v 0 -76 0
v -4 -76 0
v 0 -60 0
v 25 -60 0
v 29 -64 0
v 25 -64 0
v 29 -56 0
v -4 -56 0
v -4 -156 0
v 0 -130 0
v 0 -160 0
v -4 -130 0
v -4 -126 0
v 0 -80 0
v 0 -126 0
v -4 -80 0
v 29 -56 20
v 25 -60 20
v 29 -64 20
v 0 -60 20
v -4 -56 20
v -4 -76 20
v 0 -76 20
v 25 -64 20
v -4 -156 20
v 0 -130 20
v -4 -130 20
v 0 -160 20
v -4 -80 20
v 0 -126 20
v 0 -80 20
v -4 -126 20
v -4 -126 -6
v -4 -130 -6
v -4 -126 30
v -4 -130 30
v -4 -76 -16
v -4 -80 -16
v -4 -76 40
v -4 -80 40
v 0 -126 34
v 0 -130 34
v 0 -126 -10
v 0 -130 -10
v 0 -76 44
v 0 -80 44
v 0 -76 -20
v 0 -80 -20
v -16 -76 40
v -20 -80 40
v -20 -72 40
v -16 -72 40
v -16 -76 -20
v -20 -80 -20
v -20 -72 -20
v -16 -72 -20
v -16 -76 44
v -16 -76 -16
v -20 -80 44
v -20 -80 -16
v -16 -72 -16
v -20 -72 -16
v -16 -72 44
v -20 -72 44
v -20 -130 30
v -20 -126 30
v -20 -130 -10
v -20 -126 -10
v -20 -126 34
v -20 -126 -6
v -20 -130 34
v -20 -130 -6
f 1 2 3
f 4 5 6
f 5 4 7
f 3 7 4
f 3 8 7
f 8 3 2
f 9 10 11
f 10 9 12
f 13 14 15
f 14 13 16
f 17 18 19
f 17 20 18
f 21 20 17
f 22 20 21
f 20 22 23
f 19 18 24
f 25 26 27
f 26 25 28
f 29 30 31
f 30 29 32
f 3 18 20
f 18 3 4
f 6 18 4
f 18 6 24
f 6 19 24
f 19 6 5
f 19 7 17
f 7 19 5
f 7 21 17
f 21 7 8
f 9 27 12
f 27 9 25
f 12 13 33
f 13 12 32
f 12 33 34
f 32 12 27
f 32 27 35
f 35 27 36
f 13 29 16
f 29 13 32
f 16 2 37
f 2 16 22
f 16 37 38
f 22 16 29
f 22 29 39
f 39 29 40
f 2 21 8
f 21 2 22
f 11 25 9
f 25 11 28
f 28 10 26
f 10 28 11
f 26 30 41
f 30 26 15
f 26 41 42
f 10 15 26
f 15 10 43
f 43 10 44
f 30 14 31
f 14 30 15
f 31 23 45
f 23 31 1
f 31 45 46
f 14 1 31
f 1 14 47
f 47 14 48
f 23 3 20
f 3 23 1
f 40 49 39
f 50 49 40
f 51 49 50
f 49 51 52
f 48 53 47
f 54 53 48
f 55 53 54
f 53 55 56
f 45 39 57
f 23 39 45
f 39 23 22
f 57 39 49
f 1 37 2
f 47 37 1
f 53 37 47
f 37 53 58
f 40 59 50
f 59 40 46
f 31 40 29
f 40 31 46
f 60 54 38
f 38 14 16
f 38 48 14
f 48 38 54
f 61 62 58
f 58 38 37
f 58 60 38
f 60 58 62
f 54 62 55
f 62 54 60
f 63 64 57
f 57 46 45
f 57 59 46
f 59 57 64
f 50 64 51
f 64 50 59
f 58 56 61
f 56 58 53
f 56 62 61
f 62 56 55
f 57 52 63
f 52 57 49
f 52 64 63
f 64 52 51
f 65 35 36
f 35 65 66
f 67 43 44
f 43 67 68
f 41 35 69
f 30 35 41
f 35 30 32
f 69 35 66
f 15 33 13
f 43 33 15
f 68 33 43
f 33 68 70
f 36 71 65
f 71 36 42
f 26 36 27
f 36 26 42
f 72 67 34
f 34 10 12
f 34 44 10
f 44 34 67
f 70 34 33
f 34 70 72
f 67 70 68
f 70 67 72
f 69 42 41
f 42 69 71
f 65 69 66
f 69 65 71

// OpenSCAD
    
linear_extrude (height=20)
import (file="profil.dxf", layer="pied-coulisse1", $fn=500);

translate([-4,-80,-20])
cube([4,4,60]);

translate([-20,-80,-20])
cube([20,4,4]);
translate([-20,-80,40])
cube([20,4,4]);

translate([-20,-76,-20])
cube([4,4,4]);
translate([-20,-76,40])
cube([4,4,4]);

translate([-4,-130,-10])
cube([4,4,40]);
translate([-20,-130,-10])
cube([20,4,4]);
translate([-20,-130,30])
cube([20,4,4]);
